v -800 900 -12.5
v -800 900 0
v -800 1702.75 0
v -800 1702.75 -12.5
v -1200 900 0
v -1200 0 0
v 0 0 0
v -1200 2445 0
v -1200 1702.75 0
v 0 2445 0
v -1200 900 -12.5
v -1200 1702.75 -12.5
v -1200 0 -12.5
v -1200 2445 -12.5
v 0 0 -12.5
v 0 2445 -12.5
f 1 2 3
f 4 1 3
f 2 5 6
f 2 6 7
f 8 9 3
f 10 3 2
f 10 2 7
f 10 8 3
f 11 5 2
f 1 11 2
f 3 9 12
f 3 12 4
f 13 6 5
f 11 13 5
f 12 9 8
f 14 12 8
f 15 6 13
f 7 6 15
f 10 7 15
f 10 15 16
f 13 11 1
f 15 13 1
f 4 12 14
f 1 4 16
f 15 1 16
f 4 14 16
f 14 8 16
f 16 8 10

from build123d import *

# Parameters (mm, degrees)
SKETCH_1_W          = 1200
SKETCH_1_H          = 2445
EXTRUDE_1_DEPTH     = 12.5
SKETCH_3_W          = 400
SKETCH_3_H          = 802.75
CUT_EXTRUDE_2_DEPTH = 2724.63383185


with BuildPart() as part:
    # Эскиз1 → Бобышка-Вытянуть1 (new body)
    with BuildSketch(Plane.XY):
        with Locations((-600, 1222.5)):
            Rectangle(SKETCH_1_W, SKETCH_1_H)
    extrude(amount=-EXTRUDE_1_DEPTH)

    # Эскиз3 → Вырез-Вытянуть2 (cut, through all)
    with BuildSketch(Plane.XY):
        with Locations((-1000, 1301.375)):
            Rectangle(SKETCH_3_W, SKETCH_3_H)
    extrude(amount=-CUT_EXTRUDE_2_DEPTH, mode=Mode.SUBTRACT)


solid = part.part
